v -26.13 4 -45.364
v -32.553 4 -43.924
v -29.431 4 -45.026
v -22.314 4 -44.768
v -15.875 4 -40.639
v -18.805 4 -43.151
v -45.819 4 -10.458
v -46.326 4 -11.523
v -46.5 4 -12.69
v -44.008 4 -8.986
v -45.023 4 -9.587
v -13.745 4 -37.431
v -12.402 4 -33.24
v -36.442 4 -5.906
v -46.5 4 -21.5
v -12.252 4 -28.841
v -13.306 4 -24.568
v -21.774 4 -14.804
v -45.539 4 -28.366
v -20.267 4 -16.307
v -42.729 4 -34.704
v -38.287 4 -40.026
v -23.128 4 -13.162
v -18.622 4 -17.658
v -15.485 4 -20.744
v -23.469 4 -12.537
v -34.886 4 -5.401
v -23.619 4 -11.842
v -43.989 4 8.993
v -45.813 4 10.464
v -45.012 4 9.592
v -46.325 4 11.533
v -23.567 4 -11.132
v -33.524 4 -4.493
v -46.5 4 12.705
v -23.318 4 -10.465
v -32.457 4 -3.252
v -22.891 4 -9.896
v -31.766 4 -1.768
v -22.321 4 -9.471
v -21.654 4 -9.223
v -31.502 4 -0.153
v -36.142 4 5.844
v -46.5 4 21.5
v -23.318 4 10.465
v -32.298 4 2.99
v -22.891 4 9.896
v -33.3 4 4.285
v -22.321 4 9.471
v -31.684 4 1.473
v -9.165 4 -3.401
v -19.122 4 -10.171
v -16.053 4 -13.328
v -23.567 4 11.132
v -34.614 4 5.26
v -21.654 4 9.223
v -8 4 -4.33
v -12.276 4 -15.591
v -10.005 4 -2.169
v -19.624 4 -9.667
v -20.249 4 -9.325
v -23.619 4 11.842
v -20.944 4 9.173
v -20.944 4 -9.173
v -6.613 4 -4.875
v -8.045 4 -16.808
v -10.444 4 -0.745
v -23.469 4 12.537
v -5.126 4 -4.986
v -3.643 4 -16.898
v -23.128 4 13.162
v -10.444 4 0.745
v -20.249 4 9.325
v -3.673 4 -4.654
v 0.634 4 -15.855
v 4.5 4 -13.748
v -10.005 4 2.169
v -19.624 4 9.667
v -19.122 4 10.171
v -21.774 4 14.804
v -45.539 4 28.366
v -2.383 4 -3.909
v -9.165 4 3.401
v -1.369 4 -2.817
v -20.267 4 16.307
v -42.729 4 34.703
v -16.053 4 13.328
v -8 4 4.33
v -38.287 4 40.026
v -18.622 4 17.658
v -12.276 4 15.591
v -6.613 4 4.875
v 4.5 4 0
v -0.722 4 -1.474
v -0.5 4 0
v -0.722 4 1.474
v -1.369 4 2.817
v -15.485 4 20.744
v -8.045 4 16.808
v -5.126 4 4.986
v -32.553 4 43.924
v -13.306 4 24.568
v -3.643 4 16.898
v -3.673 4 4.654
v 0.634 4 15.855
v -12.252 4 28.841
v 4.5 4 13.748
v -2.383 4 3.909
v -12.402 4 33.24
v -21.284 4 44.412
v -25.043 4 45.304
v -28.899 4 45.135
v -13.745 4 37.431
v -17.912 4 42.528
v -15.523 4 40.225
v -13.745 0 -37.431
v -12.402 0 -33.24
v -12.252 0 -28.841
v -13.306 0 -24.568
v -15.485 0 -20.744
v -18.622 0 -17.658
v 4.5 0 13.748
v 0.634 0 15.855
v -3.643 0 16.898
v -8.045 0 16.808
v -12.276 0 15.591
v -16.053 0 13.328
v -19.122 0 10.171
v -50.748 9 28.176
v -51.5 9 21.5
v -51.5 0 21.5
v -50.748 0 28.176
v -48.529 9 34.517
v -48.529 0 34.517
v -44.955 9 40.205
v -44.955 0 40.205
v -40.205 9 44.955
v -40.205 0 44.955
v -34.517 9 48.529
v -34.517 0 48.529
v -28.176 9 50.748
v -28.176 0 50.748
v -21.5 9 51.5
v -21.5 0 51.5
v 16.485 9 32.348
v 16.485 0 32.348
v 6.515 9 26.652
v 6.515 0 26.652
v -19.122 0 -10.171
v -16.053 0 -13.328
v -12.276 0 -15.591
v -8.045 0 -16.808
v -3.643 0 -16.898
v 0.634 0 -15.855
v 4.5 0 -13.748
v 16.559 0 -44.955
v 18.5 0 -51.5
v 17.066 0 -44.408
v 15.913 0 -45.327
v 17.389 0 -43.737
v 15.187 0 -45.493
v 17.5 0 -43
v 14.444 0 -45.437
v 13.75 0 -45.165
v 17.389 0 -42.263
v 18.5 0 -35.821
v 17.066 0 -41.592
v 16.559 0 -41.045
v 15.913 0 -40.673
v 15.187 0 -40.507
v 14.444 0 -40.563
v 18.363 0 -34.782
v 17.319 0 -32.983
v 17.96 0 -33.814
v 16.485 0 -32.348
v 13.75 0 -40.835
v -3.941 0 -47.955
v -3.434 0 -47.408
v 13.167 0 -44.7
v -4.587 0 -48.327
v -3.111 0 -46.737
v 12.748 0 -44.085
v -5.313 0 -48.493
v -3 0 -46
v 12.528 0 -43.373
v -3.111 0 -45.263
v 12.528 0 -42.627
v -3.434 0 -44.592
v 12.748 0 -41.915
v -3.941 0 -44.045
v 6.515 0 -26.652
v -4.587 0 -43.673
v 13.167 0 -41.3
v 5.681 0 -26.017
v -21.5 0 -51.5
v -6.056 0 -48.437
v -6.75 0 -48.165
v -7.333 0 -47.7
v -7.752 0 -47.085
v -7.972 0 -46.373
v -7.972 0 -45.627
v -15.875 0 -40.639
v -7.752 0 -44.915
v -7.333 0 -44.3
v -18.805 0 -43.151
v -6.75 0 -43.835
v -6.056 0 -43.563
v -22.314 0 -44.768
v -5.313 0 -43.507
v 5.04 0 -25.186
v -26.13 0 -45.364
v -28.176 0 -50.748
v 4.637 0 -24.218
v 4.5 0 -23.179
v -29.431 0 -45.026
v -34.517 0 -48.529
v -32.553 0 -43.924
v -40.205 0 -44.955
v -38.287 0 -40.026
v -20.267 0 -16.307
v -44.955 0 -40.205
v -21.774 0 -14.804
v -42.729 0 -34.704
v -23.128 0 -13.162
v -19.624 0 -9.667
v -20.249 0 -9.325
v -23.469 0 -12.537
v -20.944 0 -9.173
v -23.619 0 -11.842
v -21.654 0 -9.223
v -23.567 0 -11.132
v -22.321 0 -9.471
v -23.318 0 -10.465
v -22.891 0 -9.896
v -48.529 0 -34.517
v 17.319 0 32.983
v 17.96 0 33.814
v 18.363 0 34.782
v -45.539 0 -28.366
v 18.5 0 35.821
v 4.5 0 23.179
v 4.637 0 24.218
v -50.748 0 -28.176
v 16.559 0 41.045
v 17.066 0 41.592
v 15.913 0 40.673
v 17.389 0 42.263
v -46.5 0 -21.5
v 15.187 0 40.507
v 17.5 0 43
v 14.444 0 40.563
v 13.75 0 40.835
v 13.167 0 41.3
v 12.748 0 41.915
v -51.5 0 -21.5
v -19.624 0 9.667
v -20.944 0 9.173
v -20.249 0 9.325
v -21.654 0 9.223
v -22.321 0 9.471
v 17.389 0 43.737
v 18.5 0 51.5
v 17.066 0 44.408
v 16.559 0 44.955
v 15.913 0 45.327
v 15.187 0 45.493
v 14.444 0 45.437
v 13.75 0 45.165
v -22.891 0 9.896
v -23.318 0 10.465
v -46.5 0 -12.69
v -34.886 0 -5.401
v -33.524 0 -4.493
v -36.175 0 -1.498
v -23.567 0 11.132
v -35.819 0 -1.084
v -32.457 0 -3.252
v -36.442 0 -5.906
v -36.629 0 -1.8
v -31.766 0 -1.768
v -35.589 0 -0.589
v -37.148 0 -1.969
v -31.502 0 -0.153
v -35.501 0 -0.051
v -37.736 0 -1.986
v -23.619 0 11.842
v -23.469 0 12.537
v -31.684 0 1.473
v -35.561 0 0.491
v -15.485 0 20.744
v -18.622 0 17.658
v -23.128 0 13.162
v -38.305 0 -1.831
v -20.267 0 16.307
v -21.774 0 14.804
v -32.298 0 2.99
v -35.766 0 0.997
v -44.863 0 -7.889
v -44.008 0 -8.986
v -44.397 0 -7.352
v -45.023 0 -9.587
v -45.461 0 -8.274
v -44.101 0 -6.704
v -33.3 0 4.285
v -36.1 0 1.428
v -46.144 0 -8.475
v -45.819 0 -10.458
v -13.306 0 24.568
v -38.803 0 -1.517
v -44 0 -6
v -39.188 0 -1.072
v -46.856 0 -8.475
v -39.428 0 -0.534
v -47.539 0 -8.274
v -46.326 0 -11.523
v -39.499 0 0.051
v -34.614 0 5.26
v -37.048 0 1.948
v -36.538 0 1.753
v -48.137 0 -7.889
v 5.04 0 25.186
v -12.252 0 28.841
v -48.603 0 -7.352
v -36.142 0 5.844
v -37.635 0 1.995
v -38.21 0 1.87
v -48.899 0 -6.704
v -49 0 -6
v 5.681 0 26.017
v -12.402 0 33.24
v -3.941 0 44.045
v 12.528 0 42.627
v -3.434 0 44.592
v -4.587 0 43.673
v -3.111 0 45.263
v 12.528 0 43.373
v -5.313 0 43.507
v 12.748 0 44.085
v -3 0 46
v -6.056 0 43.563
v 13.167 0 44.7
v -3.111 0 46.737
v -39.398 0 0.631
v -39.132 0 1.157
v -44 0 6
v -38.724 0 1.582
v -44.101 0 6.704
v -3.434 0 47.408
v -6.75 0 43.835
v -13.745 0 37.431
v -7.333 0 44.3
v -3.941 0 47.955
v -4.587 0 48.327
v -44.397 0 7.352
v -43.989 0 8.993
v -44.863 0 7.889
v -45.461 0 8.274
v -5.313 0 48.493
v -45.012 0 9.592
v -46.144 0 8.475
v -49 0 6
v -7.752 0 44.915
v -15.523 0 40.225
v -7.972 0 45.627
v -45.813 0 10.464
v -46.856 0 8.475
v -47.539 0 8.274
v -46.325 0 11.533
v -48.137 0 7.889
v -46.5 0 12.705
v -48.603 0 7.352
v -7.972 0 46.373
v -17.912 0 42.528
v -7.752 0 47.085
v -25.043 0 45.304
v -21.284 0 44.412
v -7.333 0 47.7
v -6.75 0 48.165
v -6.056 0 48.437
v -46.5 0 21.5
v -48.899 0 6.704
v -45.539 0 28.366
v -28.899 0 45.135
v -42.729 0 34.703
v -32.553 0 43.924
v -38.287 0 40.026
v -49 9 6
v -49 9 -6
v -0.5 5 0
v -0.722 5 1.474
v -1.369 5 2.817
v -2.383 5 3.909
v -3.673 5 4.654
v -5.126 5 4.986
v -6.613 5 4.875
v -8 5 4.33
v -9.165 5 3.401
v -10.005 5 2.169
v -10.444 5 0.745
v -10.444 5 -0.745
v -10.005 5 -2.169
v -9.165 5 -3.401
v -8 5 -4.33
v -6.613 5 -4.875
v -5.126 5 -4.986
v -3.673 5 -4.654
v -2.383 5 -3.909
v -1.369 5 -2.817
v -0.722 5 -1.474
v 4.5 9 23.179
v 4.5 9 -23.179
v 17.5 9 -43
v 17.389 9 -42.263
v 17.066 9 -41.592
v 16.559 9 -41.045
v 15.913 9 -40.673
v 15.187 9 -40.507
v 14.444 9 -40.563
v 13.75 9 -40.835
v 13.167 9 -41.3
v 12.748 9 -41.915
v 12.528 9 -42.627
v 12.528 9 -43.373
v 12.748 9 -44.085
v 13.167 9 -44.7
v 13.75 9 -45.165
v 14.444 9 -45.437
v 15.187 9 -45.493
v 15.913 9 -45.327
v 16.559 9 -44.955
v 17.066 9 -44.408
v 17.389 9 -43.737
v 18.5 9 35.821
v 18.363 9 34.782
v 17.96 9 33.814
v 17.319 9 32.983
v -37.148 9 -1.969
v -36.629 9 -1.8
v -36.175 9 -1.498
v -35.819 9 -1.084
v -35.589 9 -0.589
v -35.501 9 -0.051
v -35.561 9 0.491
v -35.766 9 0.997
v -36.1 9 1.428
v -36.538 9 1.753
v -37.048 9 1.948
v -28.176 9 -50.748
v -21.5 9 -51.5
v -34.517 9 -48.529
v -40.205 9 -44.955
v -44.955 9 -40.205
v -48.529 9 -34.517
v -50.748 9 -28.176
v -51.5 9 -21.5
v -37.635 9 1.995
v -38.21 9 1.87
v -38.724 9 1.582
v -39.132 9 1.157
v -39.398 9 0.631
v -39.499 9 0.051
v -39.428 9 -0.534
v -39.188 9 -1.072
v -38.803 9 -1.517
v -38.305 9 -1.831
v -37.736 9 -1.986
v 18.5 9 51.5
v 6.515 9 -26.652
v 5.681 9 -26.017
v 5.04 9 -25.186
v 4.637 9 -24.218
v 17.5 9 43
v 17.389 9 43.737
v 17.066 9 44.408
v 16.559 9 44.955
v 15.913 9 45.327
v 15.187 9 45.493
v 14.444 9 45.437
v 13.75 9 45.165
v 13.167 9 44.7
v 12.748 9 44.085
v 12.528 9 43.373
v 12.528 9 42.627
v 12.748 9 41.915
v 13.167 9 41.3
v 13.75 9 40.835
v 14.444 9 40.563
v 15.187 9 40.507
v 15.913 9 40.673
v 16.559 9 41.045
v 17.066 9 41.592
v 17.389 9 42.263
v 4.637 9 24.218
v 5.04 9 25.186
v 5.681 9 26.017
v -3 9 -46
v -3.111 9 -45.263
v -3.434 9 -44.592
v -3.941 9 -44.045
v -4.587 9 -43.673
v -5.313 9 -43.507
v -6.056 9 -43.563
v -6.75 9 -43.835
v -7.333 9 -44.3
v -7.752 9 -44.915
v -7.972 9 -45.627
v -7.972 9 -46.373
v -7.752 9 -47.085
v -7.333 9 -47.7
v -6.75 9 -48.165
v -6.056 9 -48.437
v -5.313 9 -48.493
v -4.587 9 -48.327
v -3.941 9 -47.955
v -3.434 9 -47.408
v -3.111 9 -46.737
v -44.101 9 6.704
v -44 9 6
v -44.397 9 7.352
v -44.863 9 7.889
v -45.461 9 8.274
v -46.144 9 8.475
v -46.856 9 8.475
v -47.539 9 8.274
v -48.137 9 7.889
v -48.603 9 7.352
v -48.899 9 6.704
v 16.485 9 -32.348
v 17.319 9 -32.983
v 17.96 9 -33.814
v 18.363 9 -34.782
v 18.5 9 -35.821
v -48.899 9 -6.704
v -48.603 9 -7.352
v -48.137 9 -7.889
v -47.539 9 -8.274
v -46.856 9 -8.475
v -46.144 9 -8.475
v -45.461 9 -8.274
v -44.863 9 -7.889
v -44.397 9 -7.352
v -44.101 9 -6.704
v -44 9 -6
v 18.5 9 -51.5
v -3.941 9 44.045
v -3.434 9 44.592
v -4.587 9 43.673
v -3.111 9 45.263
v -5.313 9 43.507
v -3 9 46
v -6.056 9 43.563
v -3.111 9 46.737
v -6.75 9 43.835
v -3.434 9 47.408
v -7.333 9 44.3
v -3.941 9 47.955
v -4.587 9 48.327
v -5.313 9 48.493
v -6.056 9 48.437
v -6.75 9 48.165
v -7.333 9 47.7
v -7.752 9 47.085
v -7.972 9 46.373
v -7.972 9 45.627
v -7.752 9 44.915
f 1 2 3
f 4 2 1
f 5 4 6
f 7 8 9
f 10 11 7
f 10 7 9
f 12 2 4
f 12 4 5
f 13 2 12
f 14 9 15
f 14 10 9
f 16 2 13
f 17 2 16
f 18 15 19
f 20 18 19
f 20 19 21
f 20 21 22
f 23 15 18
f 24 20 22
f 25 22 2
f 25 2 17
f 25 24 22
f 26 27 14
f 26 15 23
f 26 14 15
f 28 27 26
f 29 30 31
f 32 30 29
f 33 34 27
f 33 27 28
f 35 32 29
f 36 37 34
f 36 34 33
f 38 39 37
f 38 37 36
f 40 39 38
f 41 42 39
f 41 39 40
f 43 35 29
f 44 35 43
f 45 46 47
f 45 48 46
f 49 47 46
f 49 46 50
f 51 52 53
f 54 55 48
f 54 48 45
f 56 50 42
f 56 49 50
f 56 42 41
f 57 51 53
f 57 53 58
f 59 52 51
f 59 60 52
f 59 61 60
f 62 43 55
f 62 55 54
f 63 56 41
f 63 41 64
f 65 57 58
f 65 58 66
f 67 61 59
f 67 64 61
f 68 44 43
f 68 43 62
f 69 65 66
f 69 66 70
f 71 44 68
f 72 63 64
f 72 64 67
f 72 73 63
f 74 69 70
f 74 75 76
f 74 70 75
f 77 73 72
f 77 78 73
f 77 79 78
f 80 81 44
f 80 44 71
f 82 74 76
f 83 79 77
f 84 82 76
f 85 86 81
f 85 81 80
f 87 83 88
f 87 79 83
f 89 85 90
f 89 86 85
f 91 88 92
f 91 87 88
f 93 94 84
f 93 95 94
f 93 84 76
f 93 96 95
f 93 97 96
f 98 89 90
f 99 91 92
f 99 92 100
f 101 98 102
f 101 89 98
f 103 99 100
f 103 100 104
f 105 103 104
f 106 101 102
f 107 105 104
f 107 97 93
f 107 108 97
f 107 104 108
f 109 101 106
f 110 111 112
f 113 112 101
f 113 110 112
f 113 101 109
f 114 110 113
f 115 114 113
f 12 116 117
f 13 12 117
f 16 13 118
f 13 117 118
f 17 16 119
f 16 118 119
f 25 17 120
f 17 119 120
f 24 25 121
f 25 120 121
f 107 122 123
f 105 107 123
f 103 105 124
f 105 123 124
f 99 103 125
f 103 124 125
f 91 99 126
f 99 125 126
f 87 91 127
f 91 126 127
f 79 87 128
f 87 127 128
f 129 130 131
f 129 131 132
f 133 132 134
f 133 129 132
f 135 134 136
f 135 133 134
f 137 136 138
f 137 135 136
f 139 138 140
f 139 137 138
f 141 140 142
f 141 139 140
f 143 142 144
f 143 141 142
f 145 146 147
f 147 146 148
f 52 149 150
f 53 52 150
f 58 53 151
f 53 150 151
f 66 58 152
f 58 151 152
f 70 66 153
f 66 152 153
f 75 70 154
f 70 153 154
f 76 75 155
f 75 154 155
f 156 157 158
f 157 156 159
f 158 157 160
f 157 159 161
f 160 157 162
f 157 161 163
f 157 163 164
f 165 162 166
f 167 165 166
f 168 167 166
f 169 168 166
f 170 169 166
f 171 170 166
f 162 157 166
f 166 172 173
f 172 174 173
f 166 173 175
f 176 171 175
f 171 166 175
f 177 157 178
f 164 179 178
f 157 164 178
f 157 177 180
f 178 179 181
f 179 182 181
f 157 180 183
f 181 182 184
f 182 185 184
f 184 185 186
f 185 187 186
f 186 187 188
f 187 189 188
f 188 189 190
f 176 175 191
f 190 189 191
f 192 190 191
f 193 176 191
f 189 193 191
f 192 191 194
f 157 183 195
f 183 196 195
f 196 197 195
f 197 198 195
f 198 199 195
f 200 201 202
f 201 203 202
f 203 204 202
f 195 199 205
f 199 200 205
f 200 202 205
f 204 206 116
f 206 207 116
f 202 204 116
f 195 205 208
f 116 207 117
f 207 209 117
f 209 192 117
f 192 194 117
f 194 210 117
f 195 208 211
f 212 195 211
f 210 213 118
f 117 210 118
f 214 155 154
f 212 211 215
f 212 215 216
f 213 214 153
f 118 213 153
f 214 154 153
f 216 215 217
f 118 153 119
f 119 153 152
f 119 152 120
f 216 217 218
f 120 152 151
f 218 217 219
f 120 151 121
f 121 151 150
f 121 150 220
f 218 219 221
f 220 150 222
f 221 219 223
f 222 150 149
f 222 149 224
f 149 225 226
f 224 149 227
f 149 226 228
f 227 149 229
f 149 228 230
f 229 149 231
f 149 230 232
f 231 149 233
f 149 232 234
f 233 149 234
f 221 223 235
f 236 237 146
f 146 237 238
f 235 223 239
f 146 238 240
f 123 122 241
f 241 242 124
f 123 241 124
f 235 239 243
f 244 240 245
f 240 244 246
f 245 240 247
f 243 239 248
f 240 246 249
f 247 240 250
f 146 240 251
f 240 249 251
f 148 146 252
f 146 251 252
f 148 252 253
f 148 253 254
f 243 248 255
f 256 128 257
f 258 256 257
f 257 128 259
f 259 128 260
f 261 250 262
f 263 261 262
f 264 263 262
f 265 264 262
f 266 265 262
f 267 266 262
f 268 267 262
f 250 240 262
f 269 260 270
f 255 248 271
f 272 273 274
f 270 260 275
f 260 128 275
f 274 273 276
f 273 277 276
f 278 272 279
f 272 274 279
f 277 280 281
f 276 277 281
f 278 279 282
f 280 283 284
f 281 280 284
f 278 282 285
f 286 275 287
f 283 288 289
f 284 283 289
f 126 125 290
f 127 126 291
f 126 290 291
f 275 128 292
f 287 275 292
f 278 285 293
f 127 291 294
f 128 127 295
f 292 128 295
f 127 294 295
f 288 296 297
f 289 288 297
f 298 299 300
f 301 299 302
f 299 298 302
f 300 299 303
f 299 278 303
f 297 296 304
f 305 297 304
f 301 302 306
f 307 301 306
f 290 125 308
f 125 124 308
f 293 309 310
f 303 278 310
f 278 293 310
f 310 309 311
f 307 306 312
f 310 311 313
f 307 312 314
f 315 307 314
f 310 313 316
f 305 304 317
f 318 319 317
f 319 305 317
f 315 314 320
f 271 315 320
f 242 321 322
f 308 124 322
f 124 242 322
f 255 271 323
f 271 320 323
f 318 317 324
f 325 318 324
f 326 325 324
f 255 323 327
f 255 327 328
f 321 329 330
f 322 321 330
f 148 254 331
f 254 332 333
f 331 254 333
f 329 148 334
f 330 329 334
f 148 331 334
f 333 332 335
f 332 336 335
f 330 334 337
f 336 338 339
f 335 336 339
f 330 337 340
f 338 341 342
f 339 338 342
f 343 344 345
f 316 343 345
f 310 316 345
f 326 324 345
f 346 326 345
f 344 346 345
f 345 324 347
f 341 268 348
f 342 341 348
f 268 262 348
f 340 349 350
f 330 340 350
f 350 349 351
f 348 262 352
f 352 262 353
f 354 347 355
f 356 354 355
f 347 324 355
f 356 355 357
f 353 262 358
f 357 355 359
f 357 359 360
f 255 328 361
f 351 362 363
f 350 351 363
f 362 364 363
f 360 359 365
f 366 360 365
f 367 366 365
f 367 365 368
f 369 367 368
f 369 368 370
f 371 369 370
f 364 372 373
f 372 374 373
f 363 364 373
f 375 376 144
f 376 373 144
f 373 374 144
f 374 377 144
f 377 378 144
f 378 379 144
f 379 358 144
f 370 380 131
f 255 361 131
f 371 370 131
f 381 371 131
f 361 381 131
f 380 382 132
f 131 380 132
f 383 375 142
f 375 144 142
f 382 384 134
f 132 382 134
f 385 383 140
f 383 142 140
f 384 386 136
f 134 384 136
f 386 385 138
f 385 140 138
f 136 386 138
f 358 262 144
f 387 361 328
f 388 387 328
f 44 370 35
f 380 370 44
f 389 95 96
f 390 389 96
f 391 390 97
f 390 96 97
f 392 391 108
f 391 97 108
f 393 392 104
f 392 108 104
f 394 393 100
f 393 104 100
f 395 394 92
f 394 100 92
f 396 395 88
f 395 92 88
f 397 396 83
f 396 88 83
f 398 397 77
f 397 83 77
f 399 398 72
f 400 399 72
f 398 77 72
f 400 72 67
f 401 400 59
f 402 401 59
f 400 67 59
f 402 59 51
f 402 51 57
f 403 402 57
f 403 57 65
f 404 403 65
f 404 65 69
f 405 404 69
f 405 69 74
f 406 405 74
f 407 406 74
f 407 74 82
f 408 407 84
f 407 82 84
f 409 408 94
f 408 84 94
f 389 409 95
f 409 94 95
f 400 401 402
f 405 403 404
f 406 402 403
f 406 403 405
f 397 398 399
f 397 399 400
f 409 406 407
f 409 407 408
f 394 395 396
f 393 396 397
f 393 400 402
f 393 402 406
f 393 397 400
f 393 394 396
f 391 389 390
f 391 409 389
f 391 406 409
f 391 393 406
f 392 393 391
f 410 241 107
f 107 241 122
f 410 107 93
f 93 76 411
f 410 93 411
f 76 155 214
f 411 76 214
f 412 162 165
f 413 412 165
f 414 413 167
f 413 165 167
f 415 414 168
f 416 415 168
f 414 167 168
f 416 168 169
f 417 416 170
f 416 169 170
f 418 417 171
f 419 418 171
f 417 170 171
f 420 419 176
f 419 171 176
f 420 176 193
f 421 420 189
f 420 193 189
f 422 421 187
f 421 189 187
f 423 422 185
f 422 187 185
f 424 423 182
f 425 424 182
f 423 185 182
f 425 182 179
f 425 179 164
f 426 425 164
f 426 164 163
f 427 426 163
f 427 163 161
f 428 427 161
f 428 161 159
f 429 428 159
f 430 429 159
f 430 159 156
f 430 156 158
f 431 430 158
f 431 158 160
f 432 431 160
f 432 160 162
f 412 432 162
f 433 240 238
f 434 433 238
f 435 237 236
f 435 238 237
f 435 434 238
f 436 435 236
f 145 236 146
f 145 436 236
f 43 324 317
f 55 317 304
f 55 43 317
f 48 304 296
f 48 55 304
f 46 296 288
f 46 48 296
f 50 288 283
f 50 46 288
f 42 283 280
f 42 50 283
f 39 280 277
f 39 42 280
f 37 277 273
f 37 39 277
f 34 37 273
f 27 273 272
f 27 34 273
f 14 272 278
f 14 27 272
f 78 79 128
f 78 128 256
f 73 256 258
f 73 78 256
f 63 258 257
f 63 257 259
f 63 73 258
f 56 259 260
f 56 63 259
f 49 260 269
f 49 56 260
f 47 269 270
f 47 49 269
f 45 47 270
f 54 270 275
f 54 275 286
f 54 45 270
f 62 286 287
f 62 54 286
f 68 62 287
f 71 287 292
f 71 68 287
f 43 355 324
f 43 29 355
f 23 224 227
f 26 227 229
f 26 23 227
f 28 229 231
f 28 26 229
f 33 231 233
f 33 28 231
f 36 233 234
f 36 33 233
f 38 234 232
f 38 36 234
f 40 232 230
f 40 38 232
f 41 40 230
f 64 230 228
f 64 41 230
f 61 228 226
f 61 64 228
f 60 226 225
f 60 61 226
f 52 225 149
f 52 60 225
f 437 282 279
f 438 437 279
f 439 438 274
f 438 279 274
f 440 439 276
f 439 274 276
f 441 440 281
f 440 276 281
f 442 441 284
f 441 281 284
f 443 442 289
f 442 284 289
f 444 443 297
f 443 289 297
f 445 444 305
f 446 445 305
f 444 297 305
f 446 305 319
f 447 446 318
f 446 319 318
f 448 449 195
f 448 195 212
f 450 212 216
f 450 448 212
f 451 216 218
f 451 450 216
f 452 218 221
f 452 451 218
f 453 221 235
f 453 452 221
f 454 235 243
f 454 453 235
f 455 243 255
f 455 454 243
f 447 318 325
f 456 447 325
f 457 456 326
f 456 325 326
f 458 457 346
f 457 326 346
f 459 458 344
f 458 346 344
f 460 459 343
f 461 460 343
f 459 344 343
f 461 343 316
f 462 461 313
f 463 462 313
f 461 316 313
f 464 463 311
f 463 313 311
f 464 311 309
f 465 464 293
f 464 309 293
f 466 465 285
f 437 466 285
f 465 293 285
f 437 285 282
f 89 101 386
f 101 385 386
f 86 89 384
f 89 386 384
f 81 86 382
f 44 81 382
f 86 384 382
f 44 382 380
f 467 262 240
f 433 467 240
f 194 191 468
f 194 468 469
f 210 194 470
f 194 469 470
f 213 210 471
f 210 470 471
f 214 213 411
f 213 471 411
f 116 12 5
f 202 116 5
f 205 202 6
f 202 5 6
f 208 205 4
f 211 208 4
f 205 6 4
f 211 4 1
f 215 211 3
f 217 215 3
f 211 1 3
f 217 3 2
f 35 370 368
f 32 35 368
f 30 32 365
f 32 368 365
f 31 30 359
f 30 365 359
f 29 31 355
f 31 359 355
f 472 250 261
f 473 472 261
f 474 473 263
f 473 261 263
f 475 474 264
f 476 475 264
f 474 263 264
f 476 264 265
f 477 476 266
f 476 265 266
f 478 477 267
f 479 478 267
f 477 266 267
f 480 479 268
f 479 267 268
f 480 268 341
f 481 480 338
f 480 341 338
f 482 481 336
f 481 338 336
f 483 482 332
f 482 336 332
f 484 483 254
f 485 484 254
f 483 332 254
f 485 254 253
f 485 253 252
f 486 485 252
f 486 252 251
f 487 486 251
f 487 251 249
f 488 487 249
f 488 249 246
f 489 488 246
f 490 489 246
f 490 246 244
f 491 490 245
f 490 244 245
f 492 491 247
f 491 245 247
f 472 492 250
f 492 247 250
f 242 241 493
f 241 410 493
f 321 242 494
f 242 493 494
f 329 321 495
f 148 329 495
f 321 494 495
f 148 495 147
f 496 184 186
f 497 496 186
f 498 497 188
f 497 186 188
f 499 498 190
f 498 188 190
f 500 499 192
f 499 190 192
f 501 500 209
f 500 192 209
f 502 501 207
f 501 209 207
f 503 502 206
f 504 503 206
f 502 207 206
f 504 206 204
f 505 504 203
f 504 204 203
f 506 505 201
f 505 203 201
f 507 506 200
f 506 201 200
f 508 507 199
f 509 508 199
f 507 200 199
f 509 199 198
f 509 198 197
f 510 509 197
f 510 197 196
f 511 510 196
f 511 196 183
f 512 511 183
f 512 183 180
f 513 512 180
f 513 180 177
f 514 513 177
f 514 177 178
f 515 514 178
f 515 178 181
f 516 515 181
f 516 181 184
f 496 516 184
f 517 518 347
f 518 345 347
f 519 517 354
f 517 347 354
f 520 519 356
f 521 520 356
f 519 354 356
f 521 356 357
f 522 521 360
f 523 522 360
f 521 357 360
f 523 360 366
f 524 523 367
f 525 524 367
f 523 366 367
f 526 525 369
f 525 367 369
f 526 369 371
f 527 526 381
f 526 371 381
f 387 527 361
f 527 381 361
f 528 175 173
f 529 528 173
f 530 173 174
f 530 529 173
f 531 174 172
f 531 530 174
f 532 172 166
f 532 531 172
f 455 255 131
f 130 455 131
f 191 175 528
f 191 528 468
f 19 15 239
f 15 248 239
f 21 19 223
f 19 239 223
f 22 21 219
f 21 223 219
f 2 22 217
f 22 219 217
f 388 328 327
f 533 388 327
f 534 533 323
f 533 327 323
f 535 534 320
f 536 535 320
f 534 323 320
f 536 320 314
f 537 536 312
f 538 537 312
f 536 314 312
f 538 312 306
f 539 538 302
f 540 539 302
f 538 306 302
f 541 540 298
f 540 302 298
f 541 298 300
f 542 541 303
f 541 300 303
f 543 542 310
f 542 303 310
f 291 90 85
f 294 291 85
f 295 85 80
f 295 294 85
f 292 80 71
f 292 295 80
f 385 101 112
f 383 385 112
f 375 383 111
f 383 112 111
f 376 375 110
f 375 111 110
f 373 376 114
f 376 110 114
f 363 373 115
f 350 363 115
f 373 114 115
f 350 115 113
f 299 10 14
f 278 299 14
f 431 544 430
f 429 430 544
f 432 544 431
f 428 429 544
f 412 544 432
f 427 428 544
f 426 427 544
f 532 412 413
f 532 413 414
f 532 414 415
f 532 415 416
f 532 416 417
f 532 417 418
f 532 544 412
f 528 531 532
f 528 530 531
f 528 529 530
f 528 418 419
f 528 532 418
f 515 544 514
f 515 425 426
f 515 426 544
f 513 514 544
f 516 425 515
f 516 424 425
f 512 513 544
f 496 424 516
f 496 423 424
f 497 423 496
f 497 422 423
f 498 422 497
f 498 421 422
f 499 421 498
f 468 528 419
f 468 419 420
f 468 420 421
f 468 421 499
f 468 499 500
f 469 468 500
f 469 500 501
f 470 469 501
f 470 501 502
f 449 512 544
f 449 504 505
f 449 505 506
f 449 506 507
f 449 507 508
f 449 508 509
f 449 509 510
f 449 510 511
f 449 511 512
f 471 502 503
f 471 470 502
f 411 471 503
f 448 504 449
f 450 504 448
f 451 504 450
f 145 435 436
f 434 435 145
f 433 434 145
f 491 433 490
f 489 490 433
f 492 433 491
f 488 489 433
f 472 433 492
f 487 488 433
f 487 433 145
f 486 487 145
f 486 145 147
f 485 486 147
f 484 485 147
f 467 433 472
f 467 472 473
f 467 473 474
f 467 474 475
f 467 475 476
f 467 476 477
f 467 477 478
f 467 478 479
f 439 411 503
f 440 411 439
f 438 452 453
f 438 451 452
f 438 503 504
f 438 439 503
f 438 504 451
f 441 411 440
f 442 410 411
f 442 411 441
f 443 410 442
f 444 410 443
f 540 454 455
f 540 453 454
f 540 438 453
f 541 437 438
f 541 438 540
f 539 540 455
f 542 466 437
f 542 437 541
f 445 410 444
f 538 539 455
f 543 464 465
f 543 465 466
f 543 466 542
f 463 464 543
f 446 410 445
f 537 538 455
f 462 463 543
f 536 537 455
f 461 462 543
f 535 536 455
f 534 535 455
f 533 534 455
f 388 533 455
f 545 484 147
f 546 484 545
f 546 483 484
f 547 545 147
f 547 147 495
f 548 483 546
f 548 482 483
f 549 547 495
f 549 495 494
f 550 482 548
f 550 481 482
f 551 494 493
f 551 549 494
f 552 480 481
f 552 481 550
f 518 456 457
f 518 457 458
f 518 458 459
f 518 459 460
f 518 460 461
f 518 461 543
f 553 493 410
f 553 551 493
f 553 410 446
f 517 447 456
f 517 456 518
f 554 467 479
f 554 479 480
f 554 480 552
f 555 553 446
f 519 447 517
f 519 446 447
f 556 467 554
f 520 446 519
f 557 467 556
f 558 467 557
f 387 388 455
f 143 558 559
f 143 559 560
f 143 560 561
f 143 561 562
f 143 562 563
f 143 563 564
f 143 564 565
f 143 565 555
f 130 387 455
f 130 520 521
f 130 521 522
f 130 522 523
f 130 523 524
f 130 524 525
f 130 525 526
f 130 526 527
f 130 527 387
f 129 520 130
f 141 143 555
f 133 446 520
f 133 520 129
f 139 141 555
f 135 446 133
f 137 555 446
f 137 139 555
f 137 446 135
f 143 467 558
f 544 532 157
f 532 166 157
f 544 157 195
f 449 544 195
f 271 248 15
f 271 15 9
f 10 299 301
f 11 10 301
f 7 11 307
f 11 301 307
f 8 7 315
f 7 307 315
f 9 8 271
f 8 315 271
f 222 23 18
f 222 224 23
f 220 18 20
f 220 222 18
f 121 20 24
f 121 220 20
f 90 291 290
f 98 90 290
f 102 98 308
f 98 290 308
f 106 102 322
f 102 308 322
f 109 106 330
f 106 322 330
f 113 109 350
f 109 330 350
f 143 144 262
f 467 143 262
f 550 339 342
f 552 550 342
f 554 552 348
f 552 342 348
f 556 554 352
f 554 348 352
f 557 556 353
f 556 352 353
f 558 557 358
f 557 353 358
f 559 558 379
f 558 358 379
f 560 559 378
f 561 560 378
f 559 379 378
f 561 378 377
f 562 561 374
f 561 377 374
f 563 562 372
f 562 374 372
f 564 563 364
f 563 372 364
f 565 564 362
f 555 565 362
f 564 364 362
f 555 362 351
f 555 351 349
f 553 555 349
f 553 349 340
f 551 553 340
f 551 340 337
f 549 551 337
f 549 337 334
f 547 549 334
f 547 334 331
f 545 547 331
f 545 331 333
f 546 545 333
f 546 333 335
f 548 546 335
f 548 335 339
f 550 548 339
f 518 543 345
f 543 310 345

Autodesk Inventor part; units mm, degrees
ref_plane "YZ Plane" through (0, 0, 0) normal (1, 0, 0) x (0, 1, 0)
ref_plane "XZ Plane" through (0, 0, 0) normal (0, 1, 0) x (-1, 0, 0)
ref_plane "XY Plane" through (0, 0, 0) normal (0, 0, 1) x (1, 0, 0)
sketch "Sketch2" plane through (0, 0, 0) normal (0, 1, 0) x (-1, 0, 0)
  line L0 (-51.5, -51.5) -> (51.5, -51.5)
  line L1 (51.5, -51.5) -> (51.5, 51.5)
  line L2 (51.5, 51.5) -> (-51.5, 51.5)
  line L3 (-51.5, 51.5) -> (-51.5, -51.5)
  line L4 (-51.5, -51.5) -> (51.5, 51.5) construction
  line L5 (51.5, -51.5) -> (-51.5, 51.5) construction
  point P0 (0, 0)
  dimension "d6" = 103
  dimension "d7" = 103
extrude "Extrusion2" add sketch "Sketch2" along normal blind 9
fillet "Fillet3" radius 30 1 edges at (-51.5, 4.5, -51.5)
fillet "Fillet4" radius 30 1 edges at (51.5, 4.5, -51.5)
fillet "Fillet5" radius 30 1 edges at (-51.5, 4.5, 51.5)
sketch "Sketch3" plane through (0, 0, 0) normal (0, -1, 0) x (1, 0, 0)
  line L0 (51.5, 51.5) -> (51.5, -21.5) projected
  line L1 (21.5, -51.5) -> (-21.5, -51.5) projected
  line L2 (51.5, 51.5) -> (18.5, 51.5)
  line L3 (18.5, 51.5) -> (18.5, -51.5)
  line L4 (18.5, -51.5) -> (51.5, -51.5)
  line L5 (51.5, -51.5) -> (51.5, 51.5)
  point P0 (0, 0)
  dimension "d13" = 33
extrude "Extrusion3" cut sketch "Sketch3" against normal blind 9
sketch "Sketch4" plane through (0, 0, 0) normal (0, -1, 0) x (1, 0, 0)
  line L0 (-21.5, 51.5) -> (18.5, 51.5) projected
  line L1 (18.5, 51.5) -> (18.5, 25.5)
  line L2 (18.5, 51.5) -> (18.5, -51.5) projected
  line L3 (18.5, -51.5) -> (18.5, -25.5)
  line L4 (18.5, 25.5) -> (4.5, 25.5)
  line L5 (4.5, 25.5) -> (4.5, -25.5)
  line L6 (4.5, -25.5) -> (18.5, -25.5)
  line L7 (18.5, -25.5) -> (18.5, 25.5)
  point P0 (0, 0)
  dimension "d16" = 26
  dimension "d17" = 26
  dimension "d18" = 14
extrude "Extrusion4" cut sketch "Sketch4" against normal blind 9
sketch "Sketch5" plane through (0, 0, 0) normal (0, -1, 0) x (1, 0, 0)
  line L0 (18.5, 51.5) -> (18.5, 33.5)
  line L1 (18.5, 25.5) -> (18.5, 51.5) projected
  line L2 (4.5, 25.5) -> (4.5, -25.5) projected
  line L3 (18.5, 33.5) -> (4.5, 25.5)
  line L4 (18.5, 25.5) -> (4.5, 25.5) projected
  line L5 (4.5, 25.5) -> (18.5, 25.5)
  line L6 (18.5, 25.5) -> (18.5, 33.5)
  line L7 (18.5, -51.5) -> (-21.5, -51.5) projected
  line L8 (18.5, -51.5) -> (18.5, -33.5)
  line L9 (18.5, -25.5) -> (18.5, -51.5) projected
  line L10 (18.5, -33.5) -> (4.5, -25.5)
  line L11 (4.5, -25.5) -> (18.5, -25.5)
  line L12 (18.5, -25.5) -> (18.5, -33.5)
  point P0 (0, 0)
  dimension "d21" = 18
  dimension "d22" = 18
extrude "Extrusion5" cut sketch "Sketch5" against normal blind 9
fillet "Fillet6" radius 4 4 edges at (4.5, 4.5, 25.5) (18.5, 4.5, 33.5) (18.5, 4.5, -33.5) (4.5, 4.5, -25.5)
sketch "Sketch6" plane through (0, 0, 0) normal (0, -1, 0) x (1, 0, 0)
  line L0 (-21.5, 51.5) -> (18.5, 51.5) projected
  line L1 (18.5, 51.5) -> (18.5, 43)
  line L2 (18.5, 35.8213) -> (18.5, 51.5) projected
  line L3 (18.5, 43) -> (15, 43)
  circle A0 centre (15, 43) radius 2.5
  line L4 (18.5, -51.5) -> (-21.5, -51.5) projected
  line L5 (18.5, -51.5) -> (18.5, -43)
  line L6 (18.5, -35.8213) -> (18.5, -51.5) projected
  line L7 (18.5, -43) -> (15, -43)
  circle A1 centre (15, -43) radius 2.5
  line L8 (18.5, -51.5) -> (-5.5, -51.5)
  line L9 (-5.5, -51.5) -> (-5.5, -46)
  circle A2 centre (-5.5, -46) radius 2.5
  line L10 (18.5, 51.5) -> (-5.5, 51.5)
  line L11 (-5.5, 51.5) -> (-5.5, 46)
  circle A3 centre (-5.5, 46) radius 2.5
  point P0 (0, 0)
  dimension "d26" = 8.5
  dimension "d27" = 3.5
  dimension "d28" = 5
  dimension "d29" = 8.5
  dimension "d30" = 5
  dimension "d31" = 24
  dimension "d32" = 5.5
  dimension "d33" = 5
  dimension "d34" = 5.5
extrude "Extrusion6" cut sketch "Sketch6" against normal blind 9
sketch "Sketch7" plane through (0, 0, 0) normal (0, -1, 0) x (1, 0, 0)
  line L0 (4.5, 23.1787) -> (4.5, -23.1787) projected
  line L1 (4.5, 0) -> (-5.5, 0)
  circle A0 centre (-5.5, 0) radius 5
  circle A1 centre (-5.5, 0) radius 17
  point P0 (0, 0)
  dimension "d37" = 10
  dimension "d38" = 34
extrude "Extrusion7" cut sketch "Sketch7" against normal blind 4
sketch "Sketch8" plane through (-5.5, 0, 0) normal (0, -1, 0) x (1, 0, 0)
  circle A0 centre (0, 0) radius 5
  point P0 (5.5, 0)
extrude "Extrusion8" cut sketch "Sketch8" against normal blind 5
sketch "Sketch9" plane through (0, 0, 0) normal (0, -1, 0) x (1, 0, 0)
  line L0 (-21.5, 51.5) -> (18.5, 51.5) projected
  arc A0 (-21.5, 51.5) -> (-51.5, 21.5) centre (-21.5, 21.5) ccw projected
  line L1 (-51.5, -21.5) -> (-51.5, 21.5) projected
  arc A1 (-51.5, -21.5) -> (-21.5, -51.5) centre (-21.5, -21.5) ccw projected
  line L2 (18.5, -51.5) -> (-21.5, -51.5) projected
  line L3 (18.5, -46.5) -> (-21.5, -46.5)
  arc A2 (-46.5, -21.5) -> (-21.5, -46.5) centre (-21.5, -21.5) ccw
  line L4 (-46.5, -21.5) -> (-46.5, 21.5)
  arc A3 (-21.5, 46.5) -> (-46.5, 21.5) centre (-21.5, 21.5) ccw
  line L5 (-21.5, 46.5) -> (18.5, 46.5)
  arc A4 (4.5, 13.7477) -> (4.5, -13.7477) centre (-5.5, 0) ccw projected
  arc A5 (7.4412, 17.7912) -> (7.4412, -17.7912) centre (-5.5, 0) ccw
  arc A6 (-18.6225, 17.6579) -> (-25.2059, 46.2238) centre (-28.1661, 30.5) ccw
  arc A7 (-25.2059, -46.2238) -> (-18.6225, -17.6579) centre (-28.1661, -30.5) ccw
  arc A8 (5.9706, 15.7695) -> (5.9706, -15.7695) centre (-5.5, 0) ccw
  circle A9 centre (-5.5, 0) radius 5 projected
  line L6 (-5.5, 0) -> (-21.5, 11.1467)
  line L7 (-5.5, 0) -> (-21.5, -11.1467)
  circle A10 centre (-21.5, 11.1467) radius 2.5
  circle A11 centre (-21.5, -11.1467) radius 2.5
  point P0 (0, 0)
  dimension "d43" = 5
  dimension "d44" = 5
  dimension "d45" = 32
  dimension "d46" = 32
  dimension "d47" = 2.5
extrude "Extrusion9" cut sketch "Sketch9" against normal blind 4 contours L4 A3 A6 A5 A7 A2
sketch "Sketch10" plane through (0, 0, 0) normal (0, -1, 0) x (1, 0, 0)
  arc A0 (4.5, 13.7477) -> (4.5, -13.7477) centre (-5.5, 0) ccw projected
  line L0 (-5.5, 0) -> (-21.1252, 11.6663)
  line L1 (-5.5, 0) -> (-21.1252, -11.6663)
  line L2 (-21.1252, 11.6663) -> (-23.1284, 13.162)
  arc A1 (-18.6225, 17.6579) -> (-18.6225, -17.6579) centre (-5.5, 0) ccw projected
  line L3 (-21.1252, -11.6663) -> (-23.1284, -13.162)
  arc A2 (-19.122, 10.1707) -> (-19.122, -10.1707) centre (-5.5, 0) ccw
  arc A3 (7.4412, 17.7912) -> (7.4412, -17.7912) centre (-5.5, 0) ccw
  arc A4 (-19.122, 10.1707) -> (-19.122, -10.1707) centre (-5.5, 0) ccw
  point P0 (0, 0)
  dimension "d52" = 5
  dimension "d53" = 5
extrude "Extrusion10" cut sketch "Sketch10" against normal blind 4 contours A0 L1 L3 A1 L2 L0
sketch "Sketch11" plane through (0, 4, 0) normal (0, -1, 0) x (1, 0, 0)
  line L0 (-23.1284, 13.162) -> (-19.122, 10.1707) projected
  circle A0 centre (-21.1252, 11.6663) radius 2.5
  line L1 (-19.122, -10.1707) -> (-23.1284, -13.162) projected
  circle A1 centre (-21.1252, -11.6663) radius 2.5
  point P0 (0, 0)
  dimension "d56" = 5
  dimension "d57" = 5
extrude "Extrusion11" add sketch "Sketch11" along normal blind 4
fillet "Fillet7" radius 14 1 edges at (-25.2059, 2, -46.2238)
fillet "Fillet8" radius 14 1 edges at (-25.2059, 2, 46.2238)
sketch "Sketch12" plane through (0, 4, 0) normal (0, -1, 0) x (1, 0, 0)
  line L0 (-46.5, -21.5) -> (-46.5, 21.5) projected
  line L1 (-46.5, 0) -> (-31.5, 0)
  line L2 (-31.5, 0) -> (-31.5, 10)
  line L3 (-31.5, 10) -> (-46.5, 10)
  line L4 (-46.5, 10) -> (-46.5, 0)
  line L5 (-46.5, 0) -> (-31.5, 0)
  line L6 (-31.5, 0) -> (-31.5, -10)
  line L7 (-31.5, -10) -> (-46.5, -10)
  line L8 (-46.5, -10) -> (-46.5, 0)
  arc A0 (-36.4424, -5.9061) -> (-36.1425, 5.8444) centre (-37.5, 0) ccw
  line L9 (-46.5, 10) -> (-46.5, -10)
  line L10 (-46.5, -10) -> (-36.4424, -5.9061)
  line L11 (-46.5, 10) -> (-36.1425, 5.8444)
  line L12 (-46.5, 10) -> (-46.5, -10)
  point P0 (0, 0)
  dimension "d62" = 15
  dimension "d63" = 10
  dimension "d64" = 15
  dimension "d65" = 10
  dimension "d66" = 12
extrude "Extrusion12" add sketch "Sketch12" along normal blind 4 contours L0 L1 A0 L10 | L0 L11 A0 L1
fillet "Fillet9" radius 4 2 edges at (-46.5, 2, -10) (-46.5, 2, 10)
sketch "Sketch13" plane through (0, 0, 0) normal (0, -1, 0) x (1, 0, 0)
  arc A0 (-36.4424, -5.9061) -> (-36.1425, 5.8444) centre (-37.5, 0) ccw projected
  arc A1 (-37.1475, -1.9687) -> (-37.0475, 1.9481) centre (-37.5, 0) ccw
  circle A2 centre (-37.5, 0) radius 2
  line L0 (-51.5, -21.5) -> (-51.5, 21.5) projected
  line L1 (-51.5, 0) -> (-46.5, 0)
  line L2 (-46.5, 3.5) -> (-46.5, 6)
  line L3 (-46.5, -3.5) -> (-46.5, -6)
  arc A3 (-44, 6) -> (-49, 6) centre (-46.5, 6) ccw
  arc A4 (-49, -6) -> (-44, -6) centre (-46.5, -6) ccw
  line L4 (-44, -6) -> (-44, 6)
  line L5 (-49, 6) -> (-49, -6)
  point P0 (0, 0)
  dimension "d70" = 4
  dimension "d71" = 5
  dimension "d72" = 6
  dimension "d73" = 6
  dimension "d74" = 5
  dimension "d75" = 5
extrude "Extrusion13" cut sketch "Sketch13" against normal blind 9
properties part number "Kompliteringsbit"
